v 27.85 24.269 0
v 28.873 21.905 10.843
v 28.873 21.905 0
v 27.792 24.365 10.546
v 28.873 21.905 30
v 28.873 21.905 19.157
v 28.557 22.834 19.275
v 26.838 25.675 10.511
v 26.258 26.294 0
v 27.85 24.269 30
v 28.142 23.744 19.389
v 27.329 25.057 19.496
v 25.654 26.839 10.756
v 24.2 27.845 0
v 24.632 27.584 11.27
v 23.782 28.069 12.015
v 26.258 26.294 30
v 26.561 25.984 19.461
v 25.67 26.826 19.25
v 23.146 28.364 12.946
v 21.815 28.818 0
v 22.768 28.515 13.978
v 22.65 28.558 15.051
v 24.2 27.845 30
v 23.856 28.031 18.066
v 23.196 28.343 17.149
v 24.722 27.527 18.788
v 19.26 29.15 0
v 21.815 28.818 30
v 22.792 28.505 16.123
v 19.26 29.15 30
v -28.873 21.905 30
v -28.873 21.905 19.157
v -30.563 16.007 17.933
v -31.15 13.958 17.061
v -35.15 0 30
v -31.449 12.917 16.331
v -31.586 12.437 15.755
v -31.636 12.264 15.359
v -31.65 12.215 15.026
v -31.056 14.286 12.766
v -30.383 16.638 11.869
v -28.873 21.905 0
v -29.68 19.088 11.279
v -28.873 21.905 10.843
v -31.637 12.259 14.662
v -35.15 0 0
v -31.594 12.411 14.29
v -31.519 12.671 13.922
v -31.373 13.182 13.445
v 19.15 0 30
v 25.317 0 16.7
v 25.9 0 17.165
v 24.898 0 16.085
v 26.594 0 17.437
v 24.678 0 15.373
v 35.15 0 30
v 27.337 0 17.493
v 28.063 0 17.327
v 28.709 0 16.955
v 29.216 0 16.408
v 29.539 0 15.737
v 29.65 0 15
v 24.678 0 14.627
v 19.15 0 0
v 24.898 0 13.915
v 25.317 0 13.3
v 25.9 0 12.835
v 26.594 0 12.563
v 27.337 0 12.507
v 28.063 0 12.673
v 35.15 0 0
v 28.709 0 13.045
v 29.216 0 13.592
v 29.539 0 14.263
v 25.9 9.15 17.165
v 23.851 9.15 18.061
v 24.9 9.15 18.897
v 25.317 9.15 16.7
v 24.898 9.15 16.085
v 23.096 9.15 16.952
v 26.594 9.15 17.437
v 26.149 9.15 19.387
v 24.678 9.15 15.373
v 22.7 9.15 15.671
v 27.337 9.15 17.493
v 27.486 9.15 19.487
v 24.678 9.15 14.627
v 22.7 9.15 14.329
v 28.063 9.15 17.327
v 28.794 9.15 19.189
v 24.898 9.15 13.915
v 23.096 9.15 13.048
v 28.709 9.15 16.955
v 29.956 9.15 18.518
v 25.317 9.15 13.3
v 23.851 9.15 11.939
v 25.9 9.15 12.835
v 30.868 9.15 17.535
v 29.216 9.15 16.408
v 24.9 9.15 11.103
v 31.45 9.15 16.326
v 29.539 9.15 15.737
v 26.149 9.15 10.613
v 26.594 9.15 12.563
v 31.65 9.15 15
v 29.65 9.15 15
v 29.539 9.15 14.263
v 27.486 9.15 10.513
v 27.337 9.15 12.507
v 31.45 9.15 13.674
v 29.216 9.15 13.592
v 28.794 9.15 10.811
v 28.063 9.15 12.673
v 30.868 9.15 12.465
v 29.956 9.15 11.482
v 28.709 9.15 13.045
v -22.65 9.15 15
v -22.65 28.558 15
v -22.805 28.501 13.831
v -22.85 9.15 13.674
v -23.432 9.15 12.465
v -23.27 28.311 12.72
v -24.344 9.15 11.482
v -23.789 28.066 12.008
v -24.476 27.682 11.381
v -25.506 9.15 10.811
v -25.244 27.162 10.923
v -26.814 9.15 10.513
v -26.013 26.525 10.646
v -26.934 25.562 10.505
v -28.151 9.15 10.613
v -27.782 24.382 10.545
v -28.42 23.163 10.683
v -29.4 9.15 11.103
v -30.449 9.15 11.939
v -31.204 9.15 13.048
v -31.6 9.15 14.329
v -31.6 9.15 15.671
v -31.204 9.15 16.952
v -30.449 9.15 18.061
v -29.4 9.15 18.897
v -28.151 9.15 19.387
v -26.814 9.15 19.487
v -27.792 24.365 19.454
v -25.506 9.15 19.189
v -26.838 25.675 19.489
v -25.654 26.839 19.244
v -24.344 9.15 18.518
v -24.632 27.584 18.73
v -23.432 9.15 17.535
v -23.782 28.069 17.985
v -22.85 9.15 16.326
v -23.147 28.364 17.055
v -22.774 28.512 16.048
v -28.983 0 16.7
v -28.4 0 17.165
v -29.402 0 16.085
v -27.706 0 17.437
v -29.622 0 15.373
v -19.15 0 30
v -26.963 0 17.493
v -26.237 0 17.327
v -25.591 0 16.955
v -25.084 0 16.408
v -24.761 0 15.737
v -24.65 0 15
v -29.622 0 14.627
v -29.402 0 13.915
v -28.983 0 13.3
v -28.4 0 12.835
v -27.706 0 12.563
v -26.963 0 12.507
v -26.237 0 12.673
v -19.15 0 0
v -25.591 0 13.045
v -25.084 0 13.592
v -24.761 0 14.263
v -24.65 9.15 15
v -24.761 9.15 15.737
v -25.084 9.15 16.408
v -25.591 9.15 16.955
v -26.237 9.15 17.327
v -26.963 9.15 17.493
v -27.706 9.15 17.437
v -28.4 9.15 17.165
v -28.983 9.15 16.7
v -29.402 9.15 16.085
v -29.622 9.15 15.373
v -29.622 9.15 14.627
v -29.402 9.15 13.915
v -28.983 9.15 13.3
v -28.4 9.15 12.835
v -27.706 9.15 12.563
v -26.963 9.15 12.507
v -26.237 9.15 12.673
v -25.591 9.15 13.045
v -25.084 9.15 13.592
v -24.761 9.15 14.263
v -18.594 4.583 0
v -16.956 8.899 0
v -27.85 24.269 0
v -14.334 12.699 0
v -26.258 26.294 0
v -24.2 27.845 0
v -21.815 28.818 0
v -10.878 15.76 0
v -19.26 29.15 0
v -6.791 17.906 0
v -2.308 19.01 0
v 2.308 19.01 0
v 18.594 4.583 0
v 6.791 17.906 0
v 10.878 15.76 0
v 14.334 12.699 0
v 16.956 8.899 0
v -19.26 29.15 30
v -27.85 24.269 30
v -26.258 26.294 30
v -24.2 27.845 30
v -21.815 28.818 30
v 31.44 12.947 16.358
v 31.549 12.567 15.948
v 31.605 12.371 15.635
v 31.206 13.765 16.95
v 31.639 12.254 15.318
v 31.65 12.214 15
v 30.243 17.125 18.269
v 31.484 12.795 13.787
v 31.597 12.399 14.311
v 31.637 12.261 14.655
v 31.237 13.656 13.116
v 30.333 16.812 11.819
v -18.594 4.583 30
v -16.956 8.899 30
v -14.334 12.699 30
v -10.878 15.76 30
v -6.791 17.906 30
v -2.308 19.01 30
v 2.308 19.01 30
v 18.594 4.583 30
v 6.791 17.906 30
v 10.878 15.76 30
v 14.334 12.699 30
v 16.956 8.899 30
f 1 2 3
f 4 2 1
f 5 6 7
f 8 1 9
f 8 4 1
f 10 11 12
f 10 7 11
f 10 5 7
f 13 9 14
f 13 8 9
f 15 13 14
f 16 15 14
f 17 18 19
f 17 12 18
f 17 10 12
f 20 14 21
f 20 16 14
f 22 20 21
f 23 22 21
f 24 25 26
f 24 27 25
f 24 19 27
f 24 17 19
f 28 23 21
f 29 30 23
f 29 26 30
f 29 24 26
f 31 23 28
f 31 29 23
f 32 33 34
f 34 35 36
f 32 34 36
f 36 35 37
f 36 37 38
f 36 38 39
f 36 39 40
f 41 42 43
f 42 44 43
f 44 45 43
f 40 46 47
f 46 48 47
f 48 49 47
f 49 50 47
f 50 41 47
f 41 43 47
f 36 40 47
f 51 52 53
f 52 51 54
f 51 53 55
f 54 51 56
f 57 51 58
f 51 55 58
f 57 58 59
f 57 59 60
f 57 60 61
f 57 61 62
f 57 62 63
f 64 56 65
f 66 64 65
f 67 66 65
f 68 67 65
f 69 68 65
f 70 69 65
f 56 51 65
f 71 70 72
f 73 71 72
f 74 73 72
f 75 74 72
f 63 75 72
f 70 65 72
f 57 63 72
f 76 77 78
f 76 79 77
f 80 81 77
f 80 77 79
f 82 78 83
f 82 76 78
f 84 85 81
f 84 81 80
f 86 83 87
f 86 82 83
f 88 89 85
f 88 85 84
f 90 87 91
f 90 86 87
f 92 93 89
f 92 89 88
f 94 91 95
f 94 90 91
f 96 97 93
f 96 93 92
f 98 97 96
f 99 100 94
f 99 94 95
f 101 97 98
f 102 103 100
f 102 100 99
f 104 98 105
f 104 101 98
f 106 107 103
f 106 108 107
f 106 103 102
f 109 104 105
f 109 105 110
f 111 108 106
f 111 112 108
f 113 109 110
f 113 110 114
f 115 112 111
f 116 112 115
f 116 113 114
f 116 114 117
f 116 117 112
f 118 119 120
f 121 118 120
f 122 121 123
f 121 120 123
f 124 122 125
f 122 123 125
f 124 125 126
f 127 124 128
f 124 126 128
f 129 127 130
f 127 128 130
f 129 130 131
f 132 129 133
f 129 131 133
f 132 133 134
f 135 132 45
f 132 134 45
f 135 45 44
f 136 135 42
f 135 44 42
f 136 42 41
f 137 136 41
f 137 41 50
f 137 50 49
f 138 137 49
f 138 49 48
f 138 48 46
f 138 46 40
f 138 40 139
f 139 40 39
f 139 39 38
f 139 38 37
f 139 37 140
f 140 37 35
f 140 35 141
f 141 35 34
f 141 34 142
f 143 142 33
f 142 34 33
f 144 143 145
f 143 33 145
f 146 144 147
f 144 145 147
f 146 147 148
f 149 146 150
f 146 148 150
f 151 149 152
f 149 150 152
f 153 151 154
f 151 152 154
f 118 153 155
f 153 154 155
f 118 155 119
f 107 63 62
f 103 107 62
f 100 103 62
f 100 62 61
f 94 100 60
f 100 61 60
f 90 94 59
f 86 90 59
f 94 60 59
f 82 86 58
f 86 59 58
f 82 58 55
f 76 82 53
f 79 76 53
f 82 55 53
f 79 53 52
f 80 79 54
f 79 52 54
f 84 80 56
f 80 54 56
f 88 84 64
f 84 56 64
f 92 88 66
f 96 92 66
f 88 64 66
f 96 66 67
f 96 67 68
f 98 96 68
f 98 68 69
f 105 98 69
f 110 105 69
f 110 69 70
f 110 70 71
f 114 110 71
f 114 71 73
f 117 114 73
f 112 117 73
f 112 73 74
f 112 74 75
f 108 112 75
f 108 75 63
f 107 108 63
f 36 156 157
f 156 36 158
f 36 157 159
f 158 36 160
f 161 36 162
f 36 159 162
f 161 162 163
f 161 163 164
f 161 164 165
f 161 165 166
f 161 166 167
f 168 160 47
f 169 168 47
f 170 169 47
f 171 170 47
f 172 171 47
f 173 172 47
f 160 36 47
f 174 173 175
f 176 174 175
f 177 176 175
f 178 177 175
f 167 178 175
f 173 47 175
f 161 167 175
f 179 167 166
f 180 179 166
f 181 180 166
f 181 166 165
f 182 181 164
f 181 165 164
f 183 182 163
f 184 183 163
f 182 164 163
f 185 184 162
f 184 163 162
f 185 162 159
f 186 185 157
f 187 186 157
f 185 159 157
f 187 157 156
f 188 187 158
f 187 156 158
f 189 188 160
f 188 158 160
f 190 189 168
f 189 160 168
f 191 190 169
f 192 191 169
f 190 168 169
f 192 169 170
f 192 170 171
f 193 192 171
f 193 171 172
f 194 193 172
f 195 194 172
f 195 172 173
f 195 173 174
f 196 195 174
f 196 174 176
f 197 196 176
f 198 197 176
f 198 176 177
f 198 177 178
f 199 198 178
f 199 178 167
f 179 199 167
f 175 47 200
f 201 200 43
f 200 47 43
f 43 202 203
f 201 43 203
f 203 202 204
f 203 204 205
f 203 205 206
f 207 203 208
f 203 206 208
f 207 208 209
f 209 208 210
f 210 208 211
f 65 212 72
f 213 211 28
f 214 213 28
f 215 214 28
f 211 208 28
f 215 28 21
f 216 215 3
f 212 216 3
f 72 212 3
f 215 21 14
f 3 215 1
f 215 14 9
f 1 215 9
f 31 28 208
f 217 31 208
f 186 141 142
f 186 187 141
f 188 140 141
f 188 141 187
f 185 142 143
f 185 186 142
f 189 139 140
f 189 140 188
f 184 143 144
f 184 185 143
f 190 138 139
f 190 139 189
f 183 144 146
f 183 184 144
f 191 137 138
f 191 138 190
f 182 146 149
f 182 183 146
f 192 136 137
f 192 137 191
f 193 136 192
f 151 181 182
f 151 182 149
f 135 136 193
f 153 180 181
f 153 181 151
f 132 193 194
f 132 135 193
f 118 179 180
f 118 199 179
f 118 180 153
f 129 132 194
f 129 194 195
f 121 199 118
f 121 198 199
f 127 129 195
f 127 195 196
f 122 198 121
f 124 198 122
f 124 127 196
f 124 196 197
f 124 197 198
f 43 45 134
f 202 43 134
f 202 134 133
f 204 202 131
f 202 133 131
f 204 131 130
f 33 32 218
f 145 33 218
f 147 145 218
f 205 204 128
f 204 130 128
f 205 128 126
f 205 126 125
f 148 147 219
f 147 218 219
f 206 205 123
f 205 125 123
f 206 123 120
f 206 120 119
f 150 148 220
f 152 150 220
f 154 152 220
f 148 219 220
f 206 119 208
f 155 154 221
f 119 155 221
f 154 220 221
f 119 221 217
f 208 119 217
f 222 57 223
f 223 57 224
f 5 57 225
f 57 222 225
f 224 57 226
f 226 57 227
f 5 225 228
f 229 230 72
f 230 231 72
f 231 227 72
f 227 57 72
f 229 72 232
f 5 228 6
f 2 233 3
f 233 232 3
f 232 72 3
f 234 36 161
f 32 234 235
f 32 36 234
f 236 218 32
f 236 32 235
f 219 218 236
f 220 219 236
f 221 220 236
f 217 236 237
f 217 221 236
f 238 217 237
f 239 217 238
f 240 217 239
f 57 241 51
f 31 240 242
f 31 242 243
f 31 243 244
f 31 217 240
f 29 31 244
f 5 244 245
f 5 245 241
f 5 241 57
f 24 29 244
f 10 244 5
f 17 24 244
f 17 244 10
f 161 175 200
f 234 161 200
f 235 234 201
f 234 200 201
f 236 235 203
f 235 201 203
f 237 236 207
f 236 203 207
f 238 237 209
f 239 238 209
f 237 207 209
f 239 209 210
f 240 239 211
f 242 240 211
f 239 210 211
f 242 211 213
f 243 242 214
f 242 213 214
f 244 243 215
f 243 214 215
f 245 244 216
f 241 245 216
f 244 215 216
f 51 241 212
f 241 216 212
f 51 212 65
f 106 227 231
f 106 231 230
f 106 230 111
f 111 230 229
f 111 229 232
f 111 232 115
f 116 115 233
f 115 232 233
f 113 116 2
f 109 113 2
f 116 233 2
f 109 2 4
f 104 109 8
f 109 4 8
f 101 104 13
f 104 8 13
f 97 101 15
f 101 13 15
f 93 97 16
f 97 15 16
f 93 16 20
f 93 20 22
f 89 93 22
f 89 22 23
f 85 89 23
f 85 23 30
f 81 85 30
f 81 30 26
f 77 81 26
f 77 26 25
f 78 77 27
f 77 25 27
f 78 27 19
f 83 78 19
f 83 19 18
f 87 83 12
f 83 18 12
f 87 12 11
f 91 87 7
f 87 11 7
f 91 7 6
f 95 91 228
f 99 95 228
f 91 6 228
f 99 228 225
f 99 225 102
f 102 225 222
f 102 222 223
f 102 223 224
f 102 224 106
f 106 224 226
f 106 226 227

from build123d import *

# Parameters (mm, degrees)
BOSS_EXTRUDE1_DEPTH = 30
FILLET1_R           = 10
SKETCH2_R           = 2.5
CUT_EXTRUDE1_DEPTH  = 30.15
SKETCH3_R           = 4.5
CUT_EXTRUDE2_DEPTH  = 20


with BuildPart() as part:
    # Sketch1 → Boss-Extrude1 (new body)
    with BuildSketch(Plane.XY):
        with BuildLine():
            Line((-26.797076023, 29.15), (-35.15, 0))
            Line((-35.15, 0), (-19.15, 0))
            ThreePointArc((-19.15, 0), (0, 19.15), (19.15, 0))
            Line((19.15, 0), (35.15, 0))
            Line((35.15, 0), (26.797076023, 29.15))
            Line((26.797076023, 29.15), (-26.797076023, 29.15))
        make_face()
    extrude(amount=BOSS_EXTRUDE1_DEPTH)

    # Fillet1
    fillet1_edges = [part.edges().sort_by_distance(p)[0] for p in [
        (-26.797076023, 29.15, 15),
        (26.797076023, 29.15, 15),
    ]]
    fillet(fillet1_edges, radius=FILLET1_R)

    # Sketch2 → Cut-Extrude1 (cut, through all)
    with BuildSketch(Plane.XZ):
        with Locations((-27.15, 15)):
            Circle(SKETCH2_R)
        with Locations((27.15, 15)):
            Circle(SKETCH2_R)
    extrude(amount=-CUT_EXTRUDE1_DEPTH, mode=Mode.SUBTRACT)

    # Sketch3 → Cut-Extrude2 (cut)
    with BuildSketch(Plane(origin=(0, 29.15, 0), x_dir=(1, 0, 0), z_dir=(0, 1, 0))):
        with Locations((27.15, -15)):
            Circle(SKETCH3_R)
        with Locations((-27.15, -15)):
            Circle(SKETCH3_R)
    extrude(amount=-CUT_EXTRUDE2_DEPTH, mode=Mode.SUBTRACT)


solid = part.part
